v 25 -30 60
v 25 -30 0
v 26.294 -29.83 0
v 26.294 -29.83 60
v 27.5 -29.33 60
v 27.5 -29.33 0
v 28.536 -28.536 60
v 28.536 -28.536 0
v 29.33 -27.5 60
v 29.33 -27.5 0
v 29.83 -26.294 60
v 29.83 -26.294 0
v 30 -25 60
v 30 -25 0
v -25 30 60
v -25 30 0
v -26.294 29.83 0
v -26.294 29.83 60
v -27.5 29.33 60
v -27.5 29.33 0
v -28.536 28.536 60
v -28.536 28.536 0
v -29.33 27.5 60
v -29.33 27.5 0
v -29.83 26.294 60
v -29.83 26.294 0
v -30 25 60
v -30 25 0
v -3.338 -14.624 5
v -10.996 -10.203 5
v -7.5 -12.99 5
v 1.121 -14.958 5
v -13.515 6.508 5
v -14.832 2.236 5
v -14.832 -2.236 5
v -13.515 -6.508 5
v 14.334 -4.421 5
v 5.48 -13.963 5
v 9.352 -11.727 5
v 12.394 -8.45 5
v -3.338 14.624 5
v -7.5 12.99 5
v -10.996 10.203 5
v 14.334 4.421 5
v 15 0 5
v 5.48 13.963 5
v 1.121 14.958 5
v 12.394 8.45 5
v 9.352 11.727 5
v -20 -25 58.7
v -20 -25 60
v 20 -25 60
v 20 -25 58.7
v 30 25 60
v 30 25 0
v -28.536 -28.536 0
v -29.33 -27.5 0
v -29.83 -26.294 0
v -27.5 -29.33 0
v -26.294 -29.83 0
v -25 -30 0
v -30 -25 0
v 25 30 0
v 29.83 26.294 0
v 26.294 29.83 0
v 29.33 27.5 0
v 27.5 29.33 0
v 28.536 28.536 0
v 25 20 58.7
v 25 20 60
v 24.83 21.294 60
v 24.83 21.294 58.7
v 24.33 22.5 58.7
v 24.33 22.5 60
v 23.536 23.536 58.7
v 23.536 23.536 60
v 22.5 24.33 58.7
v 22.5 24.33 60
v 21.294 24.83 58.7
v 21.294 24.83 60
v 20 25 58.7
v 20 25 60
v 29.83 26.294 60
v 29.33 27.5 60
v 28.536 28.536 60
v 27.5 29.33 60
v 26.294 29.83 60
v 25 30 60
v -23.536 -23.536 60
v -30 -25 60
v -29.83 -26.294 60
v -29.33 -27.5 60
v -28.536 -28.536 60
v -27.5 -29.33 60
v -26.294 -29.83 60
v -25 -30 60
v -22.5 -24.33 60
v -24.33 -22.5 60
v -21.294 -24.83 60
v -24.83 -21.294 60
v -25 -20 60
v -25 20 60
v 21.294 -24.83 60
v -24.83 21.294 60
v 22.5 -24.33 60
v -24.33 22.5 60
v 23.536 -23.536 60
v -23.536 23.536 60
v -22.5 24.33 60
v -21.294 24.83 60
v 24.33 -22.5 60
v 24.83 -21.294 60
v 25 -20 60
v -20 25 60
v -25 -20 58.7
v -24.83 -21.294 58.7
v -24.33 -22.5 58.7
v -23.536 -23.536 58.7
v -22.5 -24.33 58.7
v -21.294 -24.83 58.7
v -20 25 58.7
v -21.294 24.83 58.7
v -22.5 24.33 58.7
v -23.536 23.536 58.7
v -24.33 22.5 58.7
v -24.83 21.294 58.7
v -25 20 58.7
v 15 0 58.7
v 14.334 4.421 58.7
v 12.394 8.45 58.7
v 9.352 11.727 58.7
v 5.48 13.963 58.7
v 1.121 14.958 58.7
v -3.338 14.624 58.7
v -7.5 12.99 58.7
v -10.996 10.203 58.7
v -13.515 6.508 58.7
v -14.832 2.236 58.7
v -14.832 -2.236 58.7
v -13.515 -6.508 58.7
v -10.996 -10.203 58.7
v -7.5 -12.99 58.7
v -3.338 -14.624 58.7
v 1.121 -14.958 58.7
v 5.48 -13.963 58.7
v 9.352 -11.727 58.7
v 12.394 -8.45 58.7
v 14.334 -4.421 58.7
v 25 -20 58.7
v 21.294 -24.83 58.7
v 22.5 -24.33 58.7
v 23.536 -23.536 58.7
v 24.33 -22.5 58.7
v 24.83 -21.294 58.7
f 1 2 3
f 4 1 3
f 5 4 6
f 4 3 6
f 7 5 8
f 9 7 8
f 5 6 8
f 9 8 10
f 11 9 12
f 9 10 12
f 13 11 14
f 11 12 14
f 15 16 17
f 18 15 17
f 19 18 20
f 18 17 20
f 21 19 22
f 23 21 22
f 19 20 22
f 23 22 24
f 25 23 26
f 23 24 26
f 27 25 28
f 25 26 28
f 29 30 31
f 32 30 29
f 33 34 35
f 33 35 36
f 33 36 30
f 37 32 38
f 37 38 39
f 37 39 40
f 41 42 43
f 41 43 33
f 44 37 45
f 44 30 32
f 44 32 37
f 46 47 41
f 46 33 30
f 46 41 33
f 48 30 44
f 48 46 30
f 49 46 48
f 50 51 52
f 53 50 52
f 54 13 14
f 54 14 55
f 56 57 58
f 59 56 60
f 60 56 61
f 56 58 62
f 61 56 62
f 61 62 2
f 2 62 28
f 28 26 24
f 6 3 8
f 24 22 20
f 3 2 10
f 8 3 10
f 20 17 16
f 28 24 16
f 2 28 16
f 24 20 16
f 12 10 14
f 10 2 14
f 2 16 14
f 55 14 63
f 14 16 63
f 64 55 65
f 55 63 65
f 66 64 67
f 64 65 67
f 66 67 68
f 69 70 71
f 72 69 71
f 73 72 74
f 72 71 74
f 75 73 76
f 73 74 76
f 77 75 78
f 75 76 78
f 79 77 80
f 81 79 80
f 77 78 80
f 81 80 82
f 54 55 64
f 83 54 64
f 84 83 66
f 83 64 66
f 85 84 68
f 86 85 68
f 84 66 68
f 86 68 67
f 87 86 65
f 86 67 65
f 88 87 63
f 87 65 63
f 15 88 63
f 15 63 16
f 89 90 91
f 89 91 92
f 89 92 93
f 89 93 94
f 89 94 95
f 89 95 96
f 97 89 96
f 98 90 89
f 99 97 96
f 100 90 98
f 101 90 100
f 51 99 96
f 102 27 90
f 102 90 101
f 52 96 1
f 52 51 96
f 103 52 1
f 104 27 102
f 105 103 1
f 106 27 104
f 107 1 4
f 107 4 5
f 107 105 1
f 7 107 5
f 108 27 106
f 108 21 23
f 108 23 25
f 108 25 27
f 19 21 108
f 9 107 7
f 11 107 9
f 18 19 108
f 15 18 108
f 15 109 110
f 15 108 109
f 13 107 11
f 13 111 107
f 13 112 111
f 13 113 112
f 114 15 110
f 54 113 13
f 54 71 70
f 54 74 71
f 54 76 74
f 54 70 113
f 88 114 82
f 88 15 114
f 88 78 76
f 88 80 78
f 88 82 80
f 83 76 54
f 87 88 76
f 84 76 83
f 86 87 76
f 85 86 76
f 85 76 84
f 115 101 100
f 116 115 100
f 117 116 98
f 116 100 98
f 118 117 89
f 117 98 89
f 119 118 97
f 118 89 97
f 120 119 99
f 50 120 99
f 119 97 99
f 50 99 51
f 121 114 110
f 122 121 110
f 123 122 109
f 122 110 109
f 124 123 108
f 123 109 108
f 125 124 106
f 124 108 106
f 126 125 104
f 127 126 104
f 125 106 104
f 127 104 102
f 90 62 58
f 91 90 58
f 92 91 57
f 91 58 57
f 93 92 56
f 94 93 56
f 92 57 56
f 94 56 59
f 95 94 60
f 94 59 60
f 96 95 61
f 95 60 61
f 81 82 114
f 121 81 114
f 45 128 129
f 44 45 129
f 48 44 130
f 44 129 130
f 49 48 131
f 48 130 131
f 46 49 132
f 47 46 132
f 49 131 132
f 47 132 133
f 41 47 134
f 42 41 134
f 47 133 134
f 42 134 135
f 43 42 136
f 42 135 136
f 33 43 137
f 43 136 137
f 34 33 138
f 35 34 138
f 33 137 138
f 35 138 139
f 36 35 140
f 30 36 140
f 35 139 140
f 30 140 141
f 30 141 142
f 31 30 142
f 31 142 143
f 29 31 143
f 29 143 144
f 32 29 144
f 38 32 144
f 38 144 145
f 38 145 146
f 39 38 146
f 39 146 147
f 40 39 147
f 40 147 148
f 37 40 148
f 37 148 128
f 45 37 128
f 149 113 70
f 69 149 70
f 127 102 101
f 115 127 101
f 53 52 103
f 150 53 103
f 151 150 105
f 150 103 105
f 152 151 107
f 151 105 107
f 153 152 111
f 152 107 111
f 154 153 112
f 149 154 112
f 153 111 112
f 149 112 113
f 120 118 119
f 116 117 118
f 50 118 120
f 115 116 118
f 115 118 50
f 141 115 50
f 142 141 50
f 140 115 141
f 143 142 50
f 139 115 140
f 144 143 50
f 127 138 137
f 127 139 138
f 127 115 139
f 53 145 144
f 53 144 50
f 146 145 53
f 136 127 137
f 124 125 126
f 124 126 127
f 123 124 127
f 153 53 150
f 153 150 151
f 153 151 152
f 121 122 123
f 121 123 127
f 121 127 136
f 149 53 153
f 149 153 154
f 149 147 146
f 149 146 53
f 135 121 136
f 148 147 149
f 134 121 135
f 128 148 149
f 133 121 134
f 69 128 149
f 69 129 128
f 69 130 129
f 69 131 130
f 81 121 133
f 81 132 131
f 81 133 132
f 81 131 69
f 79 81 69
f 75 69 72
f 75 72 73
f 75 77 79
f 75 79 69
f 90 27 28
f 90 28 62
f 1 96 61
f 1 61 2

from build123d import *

# Parameters (mm, degrees)
F1_DEPTH  = 60
F2_R      = 15
F3_DEPTH  = 1.3
F3_FACE_R = 15
F4_DEPTH  = 55


with BuildPart() as f1:
    # F0 (on Top) → F1 (new body)
    with BuildSketch(Plane.XY):
        with BuildLine():
            Line((25, 30), (-25, 30))
            ThreePointArc((-25, 30), (-28.535534, 28.535534), (-30, 25))
            Line((-30, 25), (-30, -25))
            ThreePointArc((-30, -25), (-28.535534, -28.535534), (-25, -30))
            Line((-25, -30), (25, -30))
            ThreePointArc((25, -30), (28.535534, -28.535534), (30, -25))
            Line((30, -25), (30, 25))
            ThreePointArc((30, 25), (28.535534, 28.535534), (25, 30))
        make_face()
    extrude(amount=F1_DEPTH)

    # F2 (on face) → F3 (cut)
    with BuildSketch(Plane.XY.offset(60)):
        with BuildLine():
            Line((20, 25), (-20, 25))
            ThreePointArc((-20, 25), (-23.535534, 23.535534), (-25, 20))
            Line((-25, 20), (-25, -20))
            ThreePointArc((-25, -20), (-23.535534, -23.535534), (-20, -25))
            Line((-20, -25), (20, -25))
            ThreePointArc((20, -25), (23.535534, -23.535534), (25, -20))
            Line((25, -20), (25, 20))
            ThreePointArc((25, 20), (23.535534, 23.535534), (20, 25))
        make_face()
        Circle(F2_R, mode=Mode.SUBTRACT)
    extrude(amount=-F3_DEPTH, mode=Mode.SUBTRACT)

    # F3_face (on face) → F4 (cut)
    with BuildSketch(Plane.XY.offset(60)):
        Circle(F3_FACE_R)
    extrude(amount=-F4_DEPTH, mode=Mode.SUBTRACT)


solid = f1.part
